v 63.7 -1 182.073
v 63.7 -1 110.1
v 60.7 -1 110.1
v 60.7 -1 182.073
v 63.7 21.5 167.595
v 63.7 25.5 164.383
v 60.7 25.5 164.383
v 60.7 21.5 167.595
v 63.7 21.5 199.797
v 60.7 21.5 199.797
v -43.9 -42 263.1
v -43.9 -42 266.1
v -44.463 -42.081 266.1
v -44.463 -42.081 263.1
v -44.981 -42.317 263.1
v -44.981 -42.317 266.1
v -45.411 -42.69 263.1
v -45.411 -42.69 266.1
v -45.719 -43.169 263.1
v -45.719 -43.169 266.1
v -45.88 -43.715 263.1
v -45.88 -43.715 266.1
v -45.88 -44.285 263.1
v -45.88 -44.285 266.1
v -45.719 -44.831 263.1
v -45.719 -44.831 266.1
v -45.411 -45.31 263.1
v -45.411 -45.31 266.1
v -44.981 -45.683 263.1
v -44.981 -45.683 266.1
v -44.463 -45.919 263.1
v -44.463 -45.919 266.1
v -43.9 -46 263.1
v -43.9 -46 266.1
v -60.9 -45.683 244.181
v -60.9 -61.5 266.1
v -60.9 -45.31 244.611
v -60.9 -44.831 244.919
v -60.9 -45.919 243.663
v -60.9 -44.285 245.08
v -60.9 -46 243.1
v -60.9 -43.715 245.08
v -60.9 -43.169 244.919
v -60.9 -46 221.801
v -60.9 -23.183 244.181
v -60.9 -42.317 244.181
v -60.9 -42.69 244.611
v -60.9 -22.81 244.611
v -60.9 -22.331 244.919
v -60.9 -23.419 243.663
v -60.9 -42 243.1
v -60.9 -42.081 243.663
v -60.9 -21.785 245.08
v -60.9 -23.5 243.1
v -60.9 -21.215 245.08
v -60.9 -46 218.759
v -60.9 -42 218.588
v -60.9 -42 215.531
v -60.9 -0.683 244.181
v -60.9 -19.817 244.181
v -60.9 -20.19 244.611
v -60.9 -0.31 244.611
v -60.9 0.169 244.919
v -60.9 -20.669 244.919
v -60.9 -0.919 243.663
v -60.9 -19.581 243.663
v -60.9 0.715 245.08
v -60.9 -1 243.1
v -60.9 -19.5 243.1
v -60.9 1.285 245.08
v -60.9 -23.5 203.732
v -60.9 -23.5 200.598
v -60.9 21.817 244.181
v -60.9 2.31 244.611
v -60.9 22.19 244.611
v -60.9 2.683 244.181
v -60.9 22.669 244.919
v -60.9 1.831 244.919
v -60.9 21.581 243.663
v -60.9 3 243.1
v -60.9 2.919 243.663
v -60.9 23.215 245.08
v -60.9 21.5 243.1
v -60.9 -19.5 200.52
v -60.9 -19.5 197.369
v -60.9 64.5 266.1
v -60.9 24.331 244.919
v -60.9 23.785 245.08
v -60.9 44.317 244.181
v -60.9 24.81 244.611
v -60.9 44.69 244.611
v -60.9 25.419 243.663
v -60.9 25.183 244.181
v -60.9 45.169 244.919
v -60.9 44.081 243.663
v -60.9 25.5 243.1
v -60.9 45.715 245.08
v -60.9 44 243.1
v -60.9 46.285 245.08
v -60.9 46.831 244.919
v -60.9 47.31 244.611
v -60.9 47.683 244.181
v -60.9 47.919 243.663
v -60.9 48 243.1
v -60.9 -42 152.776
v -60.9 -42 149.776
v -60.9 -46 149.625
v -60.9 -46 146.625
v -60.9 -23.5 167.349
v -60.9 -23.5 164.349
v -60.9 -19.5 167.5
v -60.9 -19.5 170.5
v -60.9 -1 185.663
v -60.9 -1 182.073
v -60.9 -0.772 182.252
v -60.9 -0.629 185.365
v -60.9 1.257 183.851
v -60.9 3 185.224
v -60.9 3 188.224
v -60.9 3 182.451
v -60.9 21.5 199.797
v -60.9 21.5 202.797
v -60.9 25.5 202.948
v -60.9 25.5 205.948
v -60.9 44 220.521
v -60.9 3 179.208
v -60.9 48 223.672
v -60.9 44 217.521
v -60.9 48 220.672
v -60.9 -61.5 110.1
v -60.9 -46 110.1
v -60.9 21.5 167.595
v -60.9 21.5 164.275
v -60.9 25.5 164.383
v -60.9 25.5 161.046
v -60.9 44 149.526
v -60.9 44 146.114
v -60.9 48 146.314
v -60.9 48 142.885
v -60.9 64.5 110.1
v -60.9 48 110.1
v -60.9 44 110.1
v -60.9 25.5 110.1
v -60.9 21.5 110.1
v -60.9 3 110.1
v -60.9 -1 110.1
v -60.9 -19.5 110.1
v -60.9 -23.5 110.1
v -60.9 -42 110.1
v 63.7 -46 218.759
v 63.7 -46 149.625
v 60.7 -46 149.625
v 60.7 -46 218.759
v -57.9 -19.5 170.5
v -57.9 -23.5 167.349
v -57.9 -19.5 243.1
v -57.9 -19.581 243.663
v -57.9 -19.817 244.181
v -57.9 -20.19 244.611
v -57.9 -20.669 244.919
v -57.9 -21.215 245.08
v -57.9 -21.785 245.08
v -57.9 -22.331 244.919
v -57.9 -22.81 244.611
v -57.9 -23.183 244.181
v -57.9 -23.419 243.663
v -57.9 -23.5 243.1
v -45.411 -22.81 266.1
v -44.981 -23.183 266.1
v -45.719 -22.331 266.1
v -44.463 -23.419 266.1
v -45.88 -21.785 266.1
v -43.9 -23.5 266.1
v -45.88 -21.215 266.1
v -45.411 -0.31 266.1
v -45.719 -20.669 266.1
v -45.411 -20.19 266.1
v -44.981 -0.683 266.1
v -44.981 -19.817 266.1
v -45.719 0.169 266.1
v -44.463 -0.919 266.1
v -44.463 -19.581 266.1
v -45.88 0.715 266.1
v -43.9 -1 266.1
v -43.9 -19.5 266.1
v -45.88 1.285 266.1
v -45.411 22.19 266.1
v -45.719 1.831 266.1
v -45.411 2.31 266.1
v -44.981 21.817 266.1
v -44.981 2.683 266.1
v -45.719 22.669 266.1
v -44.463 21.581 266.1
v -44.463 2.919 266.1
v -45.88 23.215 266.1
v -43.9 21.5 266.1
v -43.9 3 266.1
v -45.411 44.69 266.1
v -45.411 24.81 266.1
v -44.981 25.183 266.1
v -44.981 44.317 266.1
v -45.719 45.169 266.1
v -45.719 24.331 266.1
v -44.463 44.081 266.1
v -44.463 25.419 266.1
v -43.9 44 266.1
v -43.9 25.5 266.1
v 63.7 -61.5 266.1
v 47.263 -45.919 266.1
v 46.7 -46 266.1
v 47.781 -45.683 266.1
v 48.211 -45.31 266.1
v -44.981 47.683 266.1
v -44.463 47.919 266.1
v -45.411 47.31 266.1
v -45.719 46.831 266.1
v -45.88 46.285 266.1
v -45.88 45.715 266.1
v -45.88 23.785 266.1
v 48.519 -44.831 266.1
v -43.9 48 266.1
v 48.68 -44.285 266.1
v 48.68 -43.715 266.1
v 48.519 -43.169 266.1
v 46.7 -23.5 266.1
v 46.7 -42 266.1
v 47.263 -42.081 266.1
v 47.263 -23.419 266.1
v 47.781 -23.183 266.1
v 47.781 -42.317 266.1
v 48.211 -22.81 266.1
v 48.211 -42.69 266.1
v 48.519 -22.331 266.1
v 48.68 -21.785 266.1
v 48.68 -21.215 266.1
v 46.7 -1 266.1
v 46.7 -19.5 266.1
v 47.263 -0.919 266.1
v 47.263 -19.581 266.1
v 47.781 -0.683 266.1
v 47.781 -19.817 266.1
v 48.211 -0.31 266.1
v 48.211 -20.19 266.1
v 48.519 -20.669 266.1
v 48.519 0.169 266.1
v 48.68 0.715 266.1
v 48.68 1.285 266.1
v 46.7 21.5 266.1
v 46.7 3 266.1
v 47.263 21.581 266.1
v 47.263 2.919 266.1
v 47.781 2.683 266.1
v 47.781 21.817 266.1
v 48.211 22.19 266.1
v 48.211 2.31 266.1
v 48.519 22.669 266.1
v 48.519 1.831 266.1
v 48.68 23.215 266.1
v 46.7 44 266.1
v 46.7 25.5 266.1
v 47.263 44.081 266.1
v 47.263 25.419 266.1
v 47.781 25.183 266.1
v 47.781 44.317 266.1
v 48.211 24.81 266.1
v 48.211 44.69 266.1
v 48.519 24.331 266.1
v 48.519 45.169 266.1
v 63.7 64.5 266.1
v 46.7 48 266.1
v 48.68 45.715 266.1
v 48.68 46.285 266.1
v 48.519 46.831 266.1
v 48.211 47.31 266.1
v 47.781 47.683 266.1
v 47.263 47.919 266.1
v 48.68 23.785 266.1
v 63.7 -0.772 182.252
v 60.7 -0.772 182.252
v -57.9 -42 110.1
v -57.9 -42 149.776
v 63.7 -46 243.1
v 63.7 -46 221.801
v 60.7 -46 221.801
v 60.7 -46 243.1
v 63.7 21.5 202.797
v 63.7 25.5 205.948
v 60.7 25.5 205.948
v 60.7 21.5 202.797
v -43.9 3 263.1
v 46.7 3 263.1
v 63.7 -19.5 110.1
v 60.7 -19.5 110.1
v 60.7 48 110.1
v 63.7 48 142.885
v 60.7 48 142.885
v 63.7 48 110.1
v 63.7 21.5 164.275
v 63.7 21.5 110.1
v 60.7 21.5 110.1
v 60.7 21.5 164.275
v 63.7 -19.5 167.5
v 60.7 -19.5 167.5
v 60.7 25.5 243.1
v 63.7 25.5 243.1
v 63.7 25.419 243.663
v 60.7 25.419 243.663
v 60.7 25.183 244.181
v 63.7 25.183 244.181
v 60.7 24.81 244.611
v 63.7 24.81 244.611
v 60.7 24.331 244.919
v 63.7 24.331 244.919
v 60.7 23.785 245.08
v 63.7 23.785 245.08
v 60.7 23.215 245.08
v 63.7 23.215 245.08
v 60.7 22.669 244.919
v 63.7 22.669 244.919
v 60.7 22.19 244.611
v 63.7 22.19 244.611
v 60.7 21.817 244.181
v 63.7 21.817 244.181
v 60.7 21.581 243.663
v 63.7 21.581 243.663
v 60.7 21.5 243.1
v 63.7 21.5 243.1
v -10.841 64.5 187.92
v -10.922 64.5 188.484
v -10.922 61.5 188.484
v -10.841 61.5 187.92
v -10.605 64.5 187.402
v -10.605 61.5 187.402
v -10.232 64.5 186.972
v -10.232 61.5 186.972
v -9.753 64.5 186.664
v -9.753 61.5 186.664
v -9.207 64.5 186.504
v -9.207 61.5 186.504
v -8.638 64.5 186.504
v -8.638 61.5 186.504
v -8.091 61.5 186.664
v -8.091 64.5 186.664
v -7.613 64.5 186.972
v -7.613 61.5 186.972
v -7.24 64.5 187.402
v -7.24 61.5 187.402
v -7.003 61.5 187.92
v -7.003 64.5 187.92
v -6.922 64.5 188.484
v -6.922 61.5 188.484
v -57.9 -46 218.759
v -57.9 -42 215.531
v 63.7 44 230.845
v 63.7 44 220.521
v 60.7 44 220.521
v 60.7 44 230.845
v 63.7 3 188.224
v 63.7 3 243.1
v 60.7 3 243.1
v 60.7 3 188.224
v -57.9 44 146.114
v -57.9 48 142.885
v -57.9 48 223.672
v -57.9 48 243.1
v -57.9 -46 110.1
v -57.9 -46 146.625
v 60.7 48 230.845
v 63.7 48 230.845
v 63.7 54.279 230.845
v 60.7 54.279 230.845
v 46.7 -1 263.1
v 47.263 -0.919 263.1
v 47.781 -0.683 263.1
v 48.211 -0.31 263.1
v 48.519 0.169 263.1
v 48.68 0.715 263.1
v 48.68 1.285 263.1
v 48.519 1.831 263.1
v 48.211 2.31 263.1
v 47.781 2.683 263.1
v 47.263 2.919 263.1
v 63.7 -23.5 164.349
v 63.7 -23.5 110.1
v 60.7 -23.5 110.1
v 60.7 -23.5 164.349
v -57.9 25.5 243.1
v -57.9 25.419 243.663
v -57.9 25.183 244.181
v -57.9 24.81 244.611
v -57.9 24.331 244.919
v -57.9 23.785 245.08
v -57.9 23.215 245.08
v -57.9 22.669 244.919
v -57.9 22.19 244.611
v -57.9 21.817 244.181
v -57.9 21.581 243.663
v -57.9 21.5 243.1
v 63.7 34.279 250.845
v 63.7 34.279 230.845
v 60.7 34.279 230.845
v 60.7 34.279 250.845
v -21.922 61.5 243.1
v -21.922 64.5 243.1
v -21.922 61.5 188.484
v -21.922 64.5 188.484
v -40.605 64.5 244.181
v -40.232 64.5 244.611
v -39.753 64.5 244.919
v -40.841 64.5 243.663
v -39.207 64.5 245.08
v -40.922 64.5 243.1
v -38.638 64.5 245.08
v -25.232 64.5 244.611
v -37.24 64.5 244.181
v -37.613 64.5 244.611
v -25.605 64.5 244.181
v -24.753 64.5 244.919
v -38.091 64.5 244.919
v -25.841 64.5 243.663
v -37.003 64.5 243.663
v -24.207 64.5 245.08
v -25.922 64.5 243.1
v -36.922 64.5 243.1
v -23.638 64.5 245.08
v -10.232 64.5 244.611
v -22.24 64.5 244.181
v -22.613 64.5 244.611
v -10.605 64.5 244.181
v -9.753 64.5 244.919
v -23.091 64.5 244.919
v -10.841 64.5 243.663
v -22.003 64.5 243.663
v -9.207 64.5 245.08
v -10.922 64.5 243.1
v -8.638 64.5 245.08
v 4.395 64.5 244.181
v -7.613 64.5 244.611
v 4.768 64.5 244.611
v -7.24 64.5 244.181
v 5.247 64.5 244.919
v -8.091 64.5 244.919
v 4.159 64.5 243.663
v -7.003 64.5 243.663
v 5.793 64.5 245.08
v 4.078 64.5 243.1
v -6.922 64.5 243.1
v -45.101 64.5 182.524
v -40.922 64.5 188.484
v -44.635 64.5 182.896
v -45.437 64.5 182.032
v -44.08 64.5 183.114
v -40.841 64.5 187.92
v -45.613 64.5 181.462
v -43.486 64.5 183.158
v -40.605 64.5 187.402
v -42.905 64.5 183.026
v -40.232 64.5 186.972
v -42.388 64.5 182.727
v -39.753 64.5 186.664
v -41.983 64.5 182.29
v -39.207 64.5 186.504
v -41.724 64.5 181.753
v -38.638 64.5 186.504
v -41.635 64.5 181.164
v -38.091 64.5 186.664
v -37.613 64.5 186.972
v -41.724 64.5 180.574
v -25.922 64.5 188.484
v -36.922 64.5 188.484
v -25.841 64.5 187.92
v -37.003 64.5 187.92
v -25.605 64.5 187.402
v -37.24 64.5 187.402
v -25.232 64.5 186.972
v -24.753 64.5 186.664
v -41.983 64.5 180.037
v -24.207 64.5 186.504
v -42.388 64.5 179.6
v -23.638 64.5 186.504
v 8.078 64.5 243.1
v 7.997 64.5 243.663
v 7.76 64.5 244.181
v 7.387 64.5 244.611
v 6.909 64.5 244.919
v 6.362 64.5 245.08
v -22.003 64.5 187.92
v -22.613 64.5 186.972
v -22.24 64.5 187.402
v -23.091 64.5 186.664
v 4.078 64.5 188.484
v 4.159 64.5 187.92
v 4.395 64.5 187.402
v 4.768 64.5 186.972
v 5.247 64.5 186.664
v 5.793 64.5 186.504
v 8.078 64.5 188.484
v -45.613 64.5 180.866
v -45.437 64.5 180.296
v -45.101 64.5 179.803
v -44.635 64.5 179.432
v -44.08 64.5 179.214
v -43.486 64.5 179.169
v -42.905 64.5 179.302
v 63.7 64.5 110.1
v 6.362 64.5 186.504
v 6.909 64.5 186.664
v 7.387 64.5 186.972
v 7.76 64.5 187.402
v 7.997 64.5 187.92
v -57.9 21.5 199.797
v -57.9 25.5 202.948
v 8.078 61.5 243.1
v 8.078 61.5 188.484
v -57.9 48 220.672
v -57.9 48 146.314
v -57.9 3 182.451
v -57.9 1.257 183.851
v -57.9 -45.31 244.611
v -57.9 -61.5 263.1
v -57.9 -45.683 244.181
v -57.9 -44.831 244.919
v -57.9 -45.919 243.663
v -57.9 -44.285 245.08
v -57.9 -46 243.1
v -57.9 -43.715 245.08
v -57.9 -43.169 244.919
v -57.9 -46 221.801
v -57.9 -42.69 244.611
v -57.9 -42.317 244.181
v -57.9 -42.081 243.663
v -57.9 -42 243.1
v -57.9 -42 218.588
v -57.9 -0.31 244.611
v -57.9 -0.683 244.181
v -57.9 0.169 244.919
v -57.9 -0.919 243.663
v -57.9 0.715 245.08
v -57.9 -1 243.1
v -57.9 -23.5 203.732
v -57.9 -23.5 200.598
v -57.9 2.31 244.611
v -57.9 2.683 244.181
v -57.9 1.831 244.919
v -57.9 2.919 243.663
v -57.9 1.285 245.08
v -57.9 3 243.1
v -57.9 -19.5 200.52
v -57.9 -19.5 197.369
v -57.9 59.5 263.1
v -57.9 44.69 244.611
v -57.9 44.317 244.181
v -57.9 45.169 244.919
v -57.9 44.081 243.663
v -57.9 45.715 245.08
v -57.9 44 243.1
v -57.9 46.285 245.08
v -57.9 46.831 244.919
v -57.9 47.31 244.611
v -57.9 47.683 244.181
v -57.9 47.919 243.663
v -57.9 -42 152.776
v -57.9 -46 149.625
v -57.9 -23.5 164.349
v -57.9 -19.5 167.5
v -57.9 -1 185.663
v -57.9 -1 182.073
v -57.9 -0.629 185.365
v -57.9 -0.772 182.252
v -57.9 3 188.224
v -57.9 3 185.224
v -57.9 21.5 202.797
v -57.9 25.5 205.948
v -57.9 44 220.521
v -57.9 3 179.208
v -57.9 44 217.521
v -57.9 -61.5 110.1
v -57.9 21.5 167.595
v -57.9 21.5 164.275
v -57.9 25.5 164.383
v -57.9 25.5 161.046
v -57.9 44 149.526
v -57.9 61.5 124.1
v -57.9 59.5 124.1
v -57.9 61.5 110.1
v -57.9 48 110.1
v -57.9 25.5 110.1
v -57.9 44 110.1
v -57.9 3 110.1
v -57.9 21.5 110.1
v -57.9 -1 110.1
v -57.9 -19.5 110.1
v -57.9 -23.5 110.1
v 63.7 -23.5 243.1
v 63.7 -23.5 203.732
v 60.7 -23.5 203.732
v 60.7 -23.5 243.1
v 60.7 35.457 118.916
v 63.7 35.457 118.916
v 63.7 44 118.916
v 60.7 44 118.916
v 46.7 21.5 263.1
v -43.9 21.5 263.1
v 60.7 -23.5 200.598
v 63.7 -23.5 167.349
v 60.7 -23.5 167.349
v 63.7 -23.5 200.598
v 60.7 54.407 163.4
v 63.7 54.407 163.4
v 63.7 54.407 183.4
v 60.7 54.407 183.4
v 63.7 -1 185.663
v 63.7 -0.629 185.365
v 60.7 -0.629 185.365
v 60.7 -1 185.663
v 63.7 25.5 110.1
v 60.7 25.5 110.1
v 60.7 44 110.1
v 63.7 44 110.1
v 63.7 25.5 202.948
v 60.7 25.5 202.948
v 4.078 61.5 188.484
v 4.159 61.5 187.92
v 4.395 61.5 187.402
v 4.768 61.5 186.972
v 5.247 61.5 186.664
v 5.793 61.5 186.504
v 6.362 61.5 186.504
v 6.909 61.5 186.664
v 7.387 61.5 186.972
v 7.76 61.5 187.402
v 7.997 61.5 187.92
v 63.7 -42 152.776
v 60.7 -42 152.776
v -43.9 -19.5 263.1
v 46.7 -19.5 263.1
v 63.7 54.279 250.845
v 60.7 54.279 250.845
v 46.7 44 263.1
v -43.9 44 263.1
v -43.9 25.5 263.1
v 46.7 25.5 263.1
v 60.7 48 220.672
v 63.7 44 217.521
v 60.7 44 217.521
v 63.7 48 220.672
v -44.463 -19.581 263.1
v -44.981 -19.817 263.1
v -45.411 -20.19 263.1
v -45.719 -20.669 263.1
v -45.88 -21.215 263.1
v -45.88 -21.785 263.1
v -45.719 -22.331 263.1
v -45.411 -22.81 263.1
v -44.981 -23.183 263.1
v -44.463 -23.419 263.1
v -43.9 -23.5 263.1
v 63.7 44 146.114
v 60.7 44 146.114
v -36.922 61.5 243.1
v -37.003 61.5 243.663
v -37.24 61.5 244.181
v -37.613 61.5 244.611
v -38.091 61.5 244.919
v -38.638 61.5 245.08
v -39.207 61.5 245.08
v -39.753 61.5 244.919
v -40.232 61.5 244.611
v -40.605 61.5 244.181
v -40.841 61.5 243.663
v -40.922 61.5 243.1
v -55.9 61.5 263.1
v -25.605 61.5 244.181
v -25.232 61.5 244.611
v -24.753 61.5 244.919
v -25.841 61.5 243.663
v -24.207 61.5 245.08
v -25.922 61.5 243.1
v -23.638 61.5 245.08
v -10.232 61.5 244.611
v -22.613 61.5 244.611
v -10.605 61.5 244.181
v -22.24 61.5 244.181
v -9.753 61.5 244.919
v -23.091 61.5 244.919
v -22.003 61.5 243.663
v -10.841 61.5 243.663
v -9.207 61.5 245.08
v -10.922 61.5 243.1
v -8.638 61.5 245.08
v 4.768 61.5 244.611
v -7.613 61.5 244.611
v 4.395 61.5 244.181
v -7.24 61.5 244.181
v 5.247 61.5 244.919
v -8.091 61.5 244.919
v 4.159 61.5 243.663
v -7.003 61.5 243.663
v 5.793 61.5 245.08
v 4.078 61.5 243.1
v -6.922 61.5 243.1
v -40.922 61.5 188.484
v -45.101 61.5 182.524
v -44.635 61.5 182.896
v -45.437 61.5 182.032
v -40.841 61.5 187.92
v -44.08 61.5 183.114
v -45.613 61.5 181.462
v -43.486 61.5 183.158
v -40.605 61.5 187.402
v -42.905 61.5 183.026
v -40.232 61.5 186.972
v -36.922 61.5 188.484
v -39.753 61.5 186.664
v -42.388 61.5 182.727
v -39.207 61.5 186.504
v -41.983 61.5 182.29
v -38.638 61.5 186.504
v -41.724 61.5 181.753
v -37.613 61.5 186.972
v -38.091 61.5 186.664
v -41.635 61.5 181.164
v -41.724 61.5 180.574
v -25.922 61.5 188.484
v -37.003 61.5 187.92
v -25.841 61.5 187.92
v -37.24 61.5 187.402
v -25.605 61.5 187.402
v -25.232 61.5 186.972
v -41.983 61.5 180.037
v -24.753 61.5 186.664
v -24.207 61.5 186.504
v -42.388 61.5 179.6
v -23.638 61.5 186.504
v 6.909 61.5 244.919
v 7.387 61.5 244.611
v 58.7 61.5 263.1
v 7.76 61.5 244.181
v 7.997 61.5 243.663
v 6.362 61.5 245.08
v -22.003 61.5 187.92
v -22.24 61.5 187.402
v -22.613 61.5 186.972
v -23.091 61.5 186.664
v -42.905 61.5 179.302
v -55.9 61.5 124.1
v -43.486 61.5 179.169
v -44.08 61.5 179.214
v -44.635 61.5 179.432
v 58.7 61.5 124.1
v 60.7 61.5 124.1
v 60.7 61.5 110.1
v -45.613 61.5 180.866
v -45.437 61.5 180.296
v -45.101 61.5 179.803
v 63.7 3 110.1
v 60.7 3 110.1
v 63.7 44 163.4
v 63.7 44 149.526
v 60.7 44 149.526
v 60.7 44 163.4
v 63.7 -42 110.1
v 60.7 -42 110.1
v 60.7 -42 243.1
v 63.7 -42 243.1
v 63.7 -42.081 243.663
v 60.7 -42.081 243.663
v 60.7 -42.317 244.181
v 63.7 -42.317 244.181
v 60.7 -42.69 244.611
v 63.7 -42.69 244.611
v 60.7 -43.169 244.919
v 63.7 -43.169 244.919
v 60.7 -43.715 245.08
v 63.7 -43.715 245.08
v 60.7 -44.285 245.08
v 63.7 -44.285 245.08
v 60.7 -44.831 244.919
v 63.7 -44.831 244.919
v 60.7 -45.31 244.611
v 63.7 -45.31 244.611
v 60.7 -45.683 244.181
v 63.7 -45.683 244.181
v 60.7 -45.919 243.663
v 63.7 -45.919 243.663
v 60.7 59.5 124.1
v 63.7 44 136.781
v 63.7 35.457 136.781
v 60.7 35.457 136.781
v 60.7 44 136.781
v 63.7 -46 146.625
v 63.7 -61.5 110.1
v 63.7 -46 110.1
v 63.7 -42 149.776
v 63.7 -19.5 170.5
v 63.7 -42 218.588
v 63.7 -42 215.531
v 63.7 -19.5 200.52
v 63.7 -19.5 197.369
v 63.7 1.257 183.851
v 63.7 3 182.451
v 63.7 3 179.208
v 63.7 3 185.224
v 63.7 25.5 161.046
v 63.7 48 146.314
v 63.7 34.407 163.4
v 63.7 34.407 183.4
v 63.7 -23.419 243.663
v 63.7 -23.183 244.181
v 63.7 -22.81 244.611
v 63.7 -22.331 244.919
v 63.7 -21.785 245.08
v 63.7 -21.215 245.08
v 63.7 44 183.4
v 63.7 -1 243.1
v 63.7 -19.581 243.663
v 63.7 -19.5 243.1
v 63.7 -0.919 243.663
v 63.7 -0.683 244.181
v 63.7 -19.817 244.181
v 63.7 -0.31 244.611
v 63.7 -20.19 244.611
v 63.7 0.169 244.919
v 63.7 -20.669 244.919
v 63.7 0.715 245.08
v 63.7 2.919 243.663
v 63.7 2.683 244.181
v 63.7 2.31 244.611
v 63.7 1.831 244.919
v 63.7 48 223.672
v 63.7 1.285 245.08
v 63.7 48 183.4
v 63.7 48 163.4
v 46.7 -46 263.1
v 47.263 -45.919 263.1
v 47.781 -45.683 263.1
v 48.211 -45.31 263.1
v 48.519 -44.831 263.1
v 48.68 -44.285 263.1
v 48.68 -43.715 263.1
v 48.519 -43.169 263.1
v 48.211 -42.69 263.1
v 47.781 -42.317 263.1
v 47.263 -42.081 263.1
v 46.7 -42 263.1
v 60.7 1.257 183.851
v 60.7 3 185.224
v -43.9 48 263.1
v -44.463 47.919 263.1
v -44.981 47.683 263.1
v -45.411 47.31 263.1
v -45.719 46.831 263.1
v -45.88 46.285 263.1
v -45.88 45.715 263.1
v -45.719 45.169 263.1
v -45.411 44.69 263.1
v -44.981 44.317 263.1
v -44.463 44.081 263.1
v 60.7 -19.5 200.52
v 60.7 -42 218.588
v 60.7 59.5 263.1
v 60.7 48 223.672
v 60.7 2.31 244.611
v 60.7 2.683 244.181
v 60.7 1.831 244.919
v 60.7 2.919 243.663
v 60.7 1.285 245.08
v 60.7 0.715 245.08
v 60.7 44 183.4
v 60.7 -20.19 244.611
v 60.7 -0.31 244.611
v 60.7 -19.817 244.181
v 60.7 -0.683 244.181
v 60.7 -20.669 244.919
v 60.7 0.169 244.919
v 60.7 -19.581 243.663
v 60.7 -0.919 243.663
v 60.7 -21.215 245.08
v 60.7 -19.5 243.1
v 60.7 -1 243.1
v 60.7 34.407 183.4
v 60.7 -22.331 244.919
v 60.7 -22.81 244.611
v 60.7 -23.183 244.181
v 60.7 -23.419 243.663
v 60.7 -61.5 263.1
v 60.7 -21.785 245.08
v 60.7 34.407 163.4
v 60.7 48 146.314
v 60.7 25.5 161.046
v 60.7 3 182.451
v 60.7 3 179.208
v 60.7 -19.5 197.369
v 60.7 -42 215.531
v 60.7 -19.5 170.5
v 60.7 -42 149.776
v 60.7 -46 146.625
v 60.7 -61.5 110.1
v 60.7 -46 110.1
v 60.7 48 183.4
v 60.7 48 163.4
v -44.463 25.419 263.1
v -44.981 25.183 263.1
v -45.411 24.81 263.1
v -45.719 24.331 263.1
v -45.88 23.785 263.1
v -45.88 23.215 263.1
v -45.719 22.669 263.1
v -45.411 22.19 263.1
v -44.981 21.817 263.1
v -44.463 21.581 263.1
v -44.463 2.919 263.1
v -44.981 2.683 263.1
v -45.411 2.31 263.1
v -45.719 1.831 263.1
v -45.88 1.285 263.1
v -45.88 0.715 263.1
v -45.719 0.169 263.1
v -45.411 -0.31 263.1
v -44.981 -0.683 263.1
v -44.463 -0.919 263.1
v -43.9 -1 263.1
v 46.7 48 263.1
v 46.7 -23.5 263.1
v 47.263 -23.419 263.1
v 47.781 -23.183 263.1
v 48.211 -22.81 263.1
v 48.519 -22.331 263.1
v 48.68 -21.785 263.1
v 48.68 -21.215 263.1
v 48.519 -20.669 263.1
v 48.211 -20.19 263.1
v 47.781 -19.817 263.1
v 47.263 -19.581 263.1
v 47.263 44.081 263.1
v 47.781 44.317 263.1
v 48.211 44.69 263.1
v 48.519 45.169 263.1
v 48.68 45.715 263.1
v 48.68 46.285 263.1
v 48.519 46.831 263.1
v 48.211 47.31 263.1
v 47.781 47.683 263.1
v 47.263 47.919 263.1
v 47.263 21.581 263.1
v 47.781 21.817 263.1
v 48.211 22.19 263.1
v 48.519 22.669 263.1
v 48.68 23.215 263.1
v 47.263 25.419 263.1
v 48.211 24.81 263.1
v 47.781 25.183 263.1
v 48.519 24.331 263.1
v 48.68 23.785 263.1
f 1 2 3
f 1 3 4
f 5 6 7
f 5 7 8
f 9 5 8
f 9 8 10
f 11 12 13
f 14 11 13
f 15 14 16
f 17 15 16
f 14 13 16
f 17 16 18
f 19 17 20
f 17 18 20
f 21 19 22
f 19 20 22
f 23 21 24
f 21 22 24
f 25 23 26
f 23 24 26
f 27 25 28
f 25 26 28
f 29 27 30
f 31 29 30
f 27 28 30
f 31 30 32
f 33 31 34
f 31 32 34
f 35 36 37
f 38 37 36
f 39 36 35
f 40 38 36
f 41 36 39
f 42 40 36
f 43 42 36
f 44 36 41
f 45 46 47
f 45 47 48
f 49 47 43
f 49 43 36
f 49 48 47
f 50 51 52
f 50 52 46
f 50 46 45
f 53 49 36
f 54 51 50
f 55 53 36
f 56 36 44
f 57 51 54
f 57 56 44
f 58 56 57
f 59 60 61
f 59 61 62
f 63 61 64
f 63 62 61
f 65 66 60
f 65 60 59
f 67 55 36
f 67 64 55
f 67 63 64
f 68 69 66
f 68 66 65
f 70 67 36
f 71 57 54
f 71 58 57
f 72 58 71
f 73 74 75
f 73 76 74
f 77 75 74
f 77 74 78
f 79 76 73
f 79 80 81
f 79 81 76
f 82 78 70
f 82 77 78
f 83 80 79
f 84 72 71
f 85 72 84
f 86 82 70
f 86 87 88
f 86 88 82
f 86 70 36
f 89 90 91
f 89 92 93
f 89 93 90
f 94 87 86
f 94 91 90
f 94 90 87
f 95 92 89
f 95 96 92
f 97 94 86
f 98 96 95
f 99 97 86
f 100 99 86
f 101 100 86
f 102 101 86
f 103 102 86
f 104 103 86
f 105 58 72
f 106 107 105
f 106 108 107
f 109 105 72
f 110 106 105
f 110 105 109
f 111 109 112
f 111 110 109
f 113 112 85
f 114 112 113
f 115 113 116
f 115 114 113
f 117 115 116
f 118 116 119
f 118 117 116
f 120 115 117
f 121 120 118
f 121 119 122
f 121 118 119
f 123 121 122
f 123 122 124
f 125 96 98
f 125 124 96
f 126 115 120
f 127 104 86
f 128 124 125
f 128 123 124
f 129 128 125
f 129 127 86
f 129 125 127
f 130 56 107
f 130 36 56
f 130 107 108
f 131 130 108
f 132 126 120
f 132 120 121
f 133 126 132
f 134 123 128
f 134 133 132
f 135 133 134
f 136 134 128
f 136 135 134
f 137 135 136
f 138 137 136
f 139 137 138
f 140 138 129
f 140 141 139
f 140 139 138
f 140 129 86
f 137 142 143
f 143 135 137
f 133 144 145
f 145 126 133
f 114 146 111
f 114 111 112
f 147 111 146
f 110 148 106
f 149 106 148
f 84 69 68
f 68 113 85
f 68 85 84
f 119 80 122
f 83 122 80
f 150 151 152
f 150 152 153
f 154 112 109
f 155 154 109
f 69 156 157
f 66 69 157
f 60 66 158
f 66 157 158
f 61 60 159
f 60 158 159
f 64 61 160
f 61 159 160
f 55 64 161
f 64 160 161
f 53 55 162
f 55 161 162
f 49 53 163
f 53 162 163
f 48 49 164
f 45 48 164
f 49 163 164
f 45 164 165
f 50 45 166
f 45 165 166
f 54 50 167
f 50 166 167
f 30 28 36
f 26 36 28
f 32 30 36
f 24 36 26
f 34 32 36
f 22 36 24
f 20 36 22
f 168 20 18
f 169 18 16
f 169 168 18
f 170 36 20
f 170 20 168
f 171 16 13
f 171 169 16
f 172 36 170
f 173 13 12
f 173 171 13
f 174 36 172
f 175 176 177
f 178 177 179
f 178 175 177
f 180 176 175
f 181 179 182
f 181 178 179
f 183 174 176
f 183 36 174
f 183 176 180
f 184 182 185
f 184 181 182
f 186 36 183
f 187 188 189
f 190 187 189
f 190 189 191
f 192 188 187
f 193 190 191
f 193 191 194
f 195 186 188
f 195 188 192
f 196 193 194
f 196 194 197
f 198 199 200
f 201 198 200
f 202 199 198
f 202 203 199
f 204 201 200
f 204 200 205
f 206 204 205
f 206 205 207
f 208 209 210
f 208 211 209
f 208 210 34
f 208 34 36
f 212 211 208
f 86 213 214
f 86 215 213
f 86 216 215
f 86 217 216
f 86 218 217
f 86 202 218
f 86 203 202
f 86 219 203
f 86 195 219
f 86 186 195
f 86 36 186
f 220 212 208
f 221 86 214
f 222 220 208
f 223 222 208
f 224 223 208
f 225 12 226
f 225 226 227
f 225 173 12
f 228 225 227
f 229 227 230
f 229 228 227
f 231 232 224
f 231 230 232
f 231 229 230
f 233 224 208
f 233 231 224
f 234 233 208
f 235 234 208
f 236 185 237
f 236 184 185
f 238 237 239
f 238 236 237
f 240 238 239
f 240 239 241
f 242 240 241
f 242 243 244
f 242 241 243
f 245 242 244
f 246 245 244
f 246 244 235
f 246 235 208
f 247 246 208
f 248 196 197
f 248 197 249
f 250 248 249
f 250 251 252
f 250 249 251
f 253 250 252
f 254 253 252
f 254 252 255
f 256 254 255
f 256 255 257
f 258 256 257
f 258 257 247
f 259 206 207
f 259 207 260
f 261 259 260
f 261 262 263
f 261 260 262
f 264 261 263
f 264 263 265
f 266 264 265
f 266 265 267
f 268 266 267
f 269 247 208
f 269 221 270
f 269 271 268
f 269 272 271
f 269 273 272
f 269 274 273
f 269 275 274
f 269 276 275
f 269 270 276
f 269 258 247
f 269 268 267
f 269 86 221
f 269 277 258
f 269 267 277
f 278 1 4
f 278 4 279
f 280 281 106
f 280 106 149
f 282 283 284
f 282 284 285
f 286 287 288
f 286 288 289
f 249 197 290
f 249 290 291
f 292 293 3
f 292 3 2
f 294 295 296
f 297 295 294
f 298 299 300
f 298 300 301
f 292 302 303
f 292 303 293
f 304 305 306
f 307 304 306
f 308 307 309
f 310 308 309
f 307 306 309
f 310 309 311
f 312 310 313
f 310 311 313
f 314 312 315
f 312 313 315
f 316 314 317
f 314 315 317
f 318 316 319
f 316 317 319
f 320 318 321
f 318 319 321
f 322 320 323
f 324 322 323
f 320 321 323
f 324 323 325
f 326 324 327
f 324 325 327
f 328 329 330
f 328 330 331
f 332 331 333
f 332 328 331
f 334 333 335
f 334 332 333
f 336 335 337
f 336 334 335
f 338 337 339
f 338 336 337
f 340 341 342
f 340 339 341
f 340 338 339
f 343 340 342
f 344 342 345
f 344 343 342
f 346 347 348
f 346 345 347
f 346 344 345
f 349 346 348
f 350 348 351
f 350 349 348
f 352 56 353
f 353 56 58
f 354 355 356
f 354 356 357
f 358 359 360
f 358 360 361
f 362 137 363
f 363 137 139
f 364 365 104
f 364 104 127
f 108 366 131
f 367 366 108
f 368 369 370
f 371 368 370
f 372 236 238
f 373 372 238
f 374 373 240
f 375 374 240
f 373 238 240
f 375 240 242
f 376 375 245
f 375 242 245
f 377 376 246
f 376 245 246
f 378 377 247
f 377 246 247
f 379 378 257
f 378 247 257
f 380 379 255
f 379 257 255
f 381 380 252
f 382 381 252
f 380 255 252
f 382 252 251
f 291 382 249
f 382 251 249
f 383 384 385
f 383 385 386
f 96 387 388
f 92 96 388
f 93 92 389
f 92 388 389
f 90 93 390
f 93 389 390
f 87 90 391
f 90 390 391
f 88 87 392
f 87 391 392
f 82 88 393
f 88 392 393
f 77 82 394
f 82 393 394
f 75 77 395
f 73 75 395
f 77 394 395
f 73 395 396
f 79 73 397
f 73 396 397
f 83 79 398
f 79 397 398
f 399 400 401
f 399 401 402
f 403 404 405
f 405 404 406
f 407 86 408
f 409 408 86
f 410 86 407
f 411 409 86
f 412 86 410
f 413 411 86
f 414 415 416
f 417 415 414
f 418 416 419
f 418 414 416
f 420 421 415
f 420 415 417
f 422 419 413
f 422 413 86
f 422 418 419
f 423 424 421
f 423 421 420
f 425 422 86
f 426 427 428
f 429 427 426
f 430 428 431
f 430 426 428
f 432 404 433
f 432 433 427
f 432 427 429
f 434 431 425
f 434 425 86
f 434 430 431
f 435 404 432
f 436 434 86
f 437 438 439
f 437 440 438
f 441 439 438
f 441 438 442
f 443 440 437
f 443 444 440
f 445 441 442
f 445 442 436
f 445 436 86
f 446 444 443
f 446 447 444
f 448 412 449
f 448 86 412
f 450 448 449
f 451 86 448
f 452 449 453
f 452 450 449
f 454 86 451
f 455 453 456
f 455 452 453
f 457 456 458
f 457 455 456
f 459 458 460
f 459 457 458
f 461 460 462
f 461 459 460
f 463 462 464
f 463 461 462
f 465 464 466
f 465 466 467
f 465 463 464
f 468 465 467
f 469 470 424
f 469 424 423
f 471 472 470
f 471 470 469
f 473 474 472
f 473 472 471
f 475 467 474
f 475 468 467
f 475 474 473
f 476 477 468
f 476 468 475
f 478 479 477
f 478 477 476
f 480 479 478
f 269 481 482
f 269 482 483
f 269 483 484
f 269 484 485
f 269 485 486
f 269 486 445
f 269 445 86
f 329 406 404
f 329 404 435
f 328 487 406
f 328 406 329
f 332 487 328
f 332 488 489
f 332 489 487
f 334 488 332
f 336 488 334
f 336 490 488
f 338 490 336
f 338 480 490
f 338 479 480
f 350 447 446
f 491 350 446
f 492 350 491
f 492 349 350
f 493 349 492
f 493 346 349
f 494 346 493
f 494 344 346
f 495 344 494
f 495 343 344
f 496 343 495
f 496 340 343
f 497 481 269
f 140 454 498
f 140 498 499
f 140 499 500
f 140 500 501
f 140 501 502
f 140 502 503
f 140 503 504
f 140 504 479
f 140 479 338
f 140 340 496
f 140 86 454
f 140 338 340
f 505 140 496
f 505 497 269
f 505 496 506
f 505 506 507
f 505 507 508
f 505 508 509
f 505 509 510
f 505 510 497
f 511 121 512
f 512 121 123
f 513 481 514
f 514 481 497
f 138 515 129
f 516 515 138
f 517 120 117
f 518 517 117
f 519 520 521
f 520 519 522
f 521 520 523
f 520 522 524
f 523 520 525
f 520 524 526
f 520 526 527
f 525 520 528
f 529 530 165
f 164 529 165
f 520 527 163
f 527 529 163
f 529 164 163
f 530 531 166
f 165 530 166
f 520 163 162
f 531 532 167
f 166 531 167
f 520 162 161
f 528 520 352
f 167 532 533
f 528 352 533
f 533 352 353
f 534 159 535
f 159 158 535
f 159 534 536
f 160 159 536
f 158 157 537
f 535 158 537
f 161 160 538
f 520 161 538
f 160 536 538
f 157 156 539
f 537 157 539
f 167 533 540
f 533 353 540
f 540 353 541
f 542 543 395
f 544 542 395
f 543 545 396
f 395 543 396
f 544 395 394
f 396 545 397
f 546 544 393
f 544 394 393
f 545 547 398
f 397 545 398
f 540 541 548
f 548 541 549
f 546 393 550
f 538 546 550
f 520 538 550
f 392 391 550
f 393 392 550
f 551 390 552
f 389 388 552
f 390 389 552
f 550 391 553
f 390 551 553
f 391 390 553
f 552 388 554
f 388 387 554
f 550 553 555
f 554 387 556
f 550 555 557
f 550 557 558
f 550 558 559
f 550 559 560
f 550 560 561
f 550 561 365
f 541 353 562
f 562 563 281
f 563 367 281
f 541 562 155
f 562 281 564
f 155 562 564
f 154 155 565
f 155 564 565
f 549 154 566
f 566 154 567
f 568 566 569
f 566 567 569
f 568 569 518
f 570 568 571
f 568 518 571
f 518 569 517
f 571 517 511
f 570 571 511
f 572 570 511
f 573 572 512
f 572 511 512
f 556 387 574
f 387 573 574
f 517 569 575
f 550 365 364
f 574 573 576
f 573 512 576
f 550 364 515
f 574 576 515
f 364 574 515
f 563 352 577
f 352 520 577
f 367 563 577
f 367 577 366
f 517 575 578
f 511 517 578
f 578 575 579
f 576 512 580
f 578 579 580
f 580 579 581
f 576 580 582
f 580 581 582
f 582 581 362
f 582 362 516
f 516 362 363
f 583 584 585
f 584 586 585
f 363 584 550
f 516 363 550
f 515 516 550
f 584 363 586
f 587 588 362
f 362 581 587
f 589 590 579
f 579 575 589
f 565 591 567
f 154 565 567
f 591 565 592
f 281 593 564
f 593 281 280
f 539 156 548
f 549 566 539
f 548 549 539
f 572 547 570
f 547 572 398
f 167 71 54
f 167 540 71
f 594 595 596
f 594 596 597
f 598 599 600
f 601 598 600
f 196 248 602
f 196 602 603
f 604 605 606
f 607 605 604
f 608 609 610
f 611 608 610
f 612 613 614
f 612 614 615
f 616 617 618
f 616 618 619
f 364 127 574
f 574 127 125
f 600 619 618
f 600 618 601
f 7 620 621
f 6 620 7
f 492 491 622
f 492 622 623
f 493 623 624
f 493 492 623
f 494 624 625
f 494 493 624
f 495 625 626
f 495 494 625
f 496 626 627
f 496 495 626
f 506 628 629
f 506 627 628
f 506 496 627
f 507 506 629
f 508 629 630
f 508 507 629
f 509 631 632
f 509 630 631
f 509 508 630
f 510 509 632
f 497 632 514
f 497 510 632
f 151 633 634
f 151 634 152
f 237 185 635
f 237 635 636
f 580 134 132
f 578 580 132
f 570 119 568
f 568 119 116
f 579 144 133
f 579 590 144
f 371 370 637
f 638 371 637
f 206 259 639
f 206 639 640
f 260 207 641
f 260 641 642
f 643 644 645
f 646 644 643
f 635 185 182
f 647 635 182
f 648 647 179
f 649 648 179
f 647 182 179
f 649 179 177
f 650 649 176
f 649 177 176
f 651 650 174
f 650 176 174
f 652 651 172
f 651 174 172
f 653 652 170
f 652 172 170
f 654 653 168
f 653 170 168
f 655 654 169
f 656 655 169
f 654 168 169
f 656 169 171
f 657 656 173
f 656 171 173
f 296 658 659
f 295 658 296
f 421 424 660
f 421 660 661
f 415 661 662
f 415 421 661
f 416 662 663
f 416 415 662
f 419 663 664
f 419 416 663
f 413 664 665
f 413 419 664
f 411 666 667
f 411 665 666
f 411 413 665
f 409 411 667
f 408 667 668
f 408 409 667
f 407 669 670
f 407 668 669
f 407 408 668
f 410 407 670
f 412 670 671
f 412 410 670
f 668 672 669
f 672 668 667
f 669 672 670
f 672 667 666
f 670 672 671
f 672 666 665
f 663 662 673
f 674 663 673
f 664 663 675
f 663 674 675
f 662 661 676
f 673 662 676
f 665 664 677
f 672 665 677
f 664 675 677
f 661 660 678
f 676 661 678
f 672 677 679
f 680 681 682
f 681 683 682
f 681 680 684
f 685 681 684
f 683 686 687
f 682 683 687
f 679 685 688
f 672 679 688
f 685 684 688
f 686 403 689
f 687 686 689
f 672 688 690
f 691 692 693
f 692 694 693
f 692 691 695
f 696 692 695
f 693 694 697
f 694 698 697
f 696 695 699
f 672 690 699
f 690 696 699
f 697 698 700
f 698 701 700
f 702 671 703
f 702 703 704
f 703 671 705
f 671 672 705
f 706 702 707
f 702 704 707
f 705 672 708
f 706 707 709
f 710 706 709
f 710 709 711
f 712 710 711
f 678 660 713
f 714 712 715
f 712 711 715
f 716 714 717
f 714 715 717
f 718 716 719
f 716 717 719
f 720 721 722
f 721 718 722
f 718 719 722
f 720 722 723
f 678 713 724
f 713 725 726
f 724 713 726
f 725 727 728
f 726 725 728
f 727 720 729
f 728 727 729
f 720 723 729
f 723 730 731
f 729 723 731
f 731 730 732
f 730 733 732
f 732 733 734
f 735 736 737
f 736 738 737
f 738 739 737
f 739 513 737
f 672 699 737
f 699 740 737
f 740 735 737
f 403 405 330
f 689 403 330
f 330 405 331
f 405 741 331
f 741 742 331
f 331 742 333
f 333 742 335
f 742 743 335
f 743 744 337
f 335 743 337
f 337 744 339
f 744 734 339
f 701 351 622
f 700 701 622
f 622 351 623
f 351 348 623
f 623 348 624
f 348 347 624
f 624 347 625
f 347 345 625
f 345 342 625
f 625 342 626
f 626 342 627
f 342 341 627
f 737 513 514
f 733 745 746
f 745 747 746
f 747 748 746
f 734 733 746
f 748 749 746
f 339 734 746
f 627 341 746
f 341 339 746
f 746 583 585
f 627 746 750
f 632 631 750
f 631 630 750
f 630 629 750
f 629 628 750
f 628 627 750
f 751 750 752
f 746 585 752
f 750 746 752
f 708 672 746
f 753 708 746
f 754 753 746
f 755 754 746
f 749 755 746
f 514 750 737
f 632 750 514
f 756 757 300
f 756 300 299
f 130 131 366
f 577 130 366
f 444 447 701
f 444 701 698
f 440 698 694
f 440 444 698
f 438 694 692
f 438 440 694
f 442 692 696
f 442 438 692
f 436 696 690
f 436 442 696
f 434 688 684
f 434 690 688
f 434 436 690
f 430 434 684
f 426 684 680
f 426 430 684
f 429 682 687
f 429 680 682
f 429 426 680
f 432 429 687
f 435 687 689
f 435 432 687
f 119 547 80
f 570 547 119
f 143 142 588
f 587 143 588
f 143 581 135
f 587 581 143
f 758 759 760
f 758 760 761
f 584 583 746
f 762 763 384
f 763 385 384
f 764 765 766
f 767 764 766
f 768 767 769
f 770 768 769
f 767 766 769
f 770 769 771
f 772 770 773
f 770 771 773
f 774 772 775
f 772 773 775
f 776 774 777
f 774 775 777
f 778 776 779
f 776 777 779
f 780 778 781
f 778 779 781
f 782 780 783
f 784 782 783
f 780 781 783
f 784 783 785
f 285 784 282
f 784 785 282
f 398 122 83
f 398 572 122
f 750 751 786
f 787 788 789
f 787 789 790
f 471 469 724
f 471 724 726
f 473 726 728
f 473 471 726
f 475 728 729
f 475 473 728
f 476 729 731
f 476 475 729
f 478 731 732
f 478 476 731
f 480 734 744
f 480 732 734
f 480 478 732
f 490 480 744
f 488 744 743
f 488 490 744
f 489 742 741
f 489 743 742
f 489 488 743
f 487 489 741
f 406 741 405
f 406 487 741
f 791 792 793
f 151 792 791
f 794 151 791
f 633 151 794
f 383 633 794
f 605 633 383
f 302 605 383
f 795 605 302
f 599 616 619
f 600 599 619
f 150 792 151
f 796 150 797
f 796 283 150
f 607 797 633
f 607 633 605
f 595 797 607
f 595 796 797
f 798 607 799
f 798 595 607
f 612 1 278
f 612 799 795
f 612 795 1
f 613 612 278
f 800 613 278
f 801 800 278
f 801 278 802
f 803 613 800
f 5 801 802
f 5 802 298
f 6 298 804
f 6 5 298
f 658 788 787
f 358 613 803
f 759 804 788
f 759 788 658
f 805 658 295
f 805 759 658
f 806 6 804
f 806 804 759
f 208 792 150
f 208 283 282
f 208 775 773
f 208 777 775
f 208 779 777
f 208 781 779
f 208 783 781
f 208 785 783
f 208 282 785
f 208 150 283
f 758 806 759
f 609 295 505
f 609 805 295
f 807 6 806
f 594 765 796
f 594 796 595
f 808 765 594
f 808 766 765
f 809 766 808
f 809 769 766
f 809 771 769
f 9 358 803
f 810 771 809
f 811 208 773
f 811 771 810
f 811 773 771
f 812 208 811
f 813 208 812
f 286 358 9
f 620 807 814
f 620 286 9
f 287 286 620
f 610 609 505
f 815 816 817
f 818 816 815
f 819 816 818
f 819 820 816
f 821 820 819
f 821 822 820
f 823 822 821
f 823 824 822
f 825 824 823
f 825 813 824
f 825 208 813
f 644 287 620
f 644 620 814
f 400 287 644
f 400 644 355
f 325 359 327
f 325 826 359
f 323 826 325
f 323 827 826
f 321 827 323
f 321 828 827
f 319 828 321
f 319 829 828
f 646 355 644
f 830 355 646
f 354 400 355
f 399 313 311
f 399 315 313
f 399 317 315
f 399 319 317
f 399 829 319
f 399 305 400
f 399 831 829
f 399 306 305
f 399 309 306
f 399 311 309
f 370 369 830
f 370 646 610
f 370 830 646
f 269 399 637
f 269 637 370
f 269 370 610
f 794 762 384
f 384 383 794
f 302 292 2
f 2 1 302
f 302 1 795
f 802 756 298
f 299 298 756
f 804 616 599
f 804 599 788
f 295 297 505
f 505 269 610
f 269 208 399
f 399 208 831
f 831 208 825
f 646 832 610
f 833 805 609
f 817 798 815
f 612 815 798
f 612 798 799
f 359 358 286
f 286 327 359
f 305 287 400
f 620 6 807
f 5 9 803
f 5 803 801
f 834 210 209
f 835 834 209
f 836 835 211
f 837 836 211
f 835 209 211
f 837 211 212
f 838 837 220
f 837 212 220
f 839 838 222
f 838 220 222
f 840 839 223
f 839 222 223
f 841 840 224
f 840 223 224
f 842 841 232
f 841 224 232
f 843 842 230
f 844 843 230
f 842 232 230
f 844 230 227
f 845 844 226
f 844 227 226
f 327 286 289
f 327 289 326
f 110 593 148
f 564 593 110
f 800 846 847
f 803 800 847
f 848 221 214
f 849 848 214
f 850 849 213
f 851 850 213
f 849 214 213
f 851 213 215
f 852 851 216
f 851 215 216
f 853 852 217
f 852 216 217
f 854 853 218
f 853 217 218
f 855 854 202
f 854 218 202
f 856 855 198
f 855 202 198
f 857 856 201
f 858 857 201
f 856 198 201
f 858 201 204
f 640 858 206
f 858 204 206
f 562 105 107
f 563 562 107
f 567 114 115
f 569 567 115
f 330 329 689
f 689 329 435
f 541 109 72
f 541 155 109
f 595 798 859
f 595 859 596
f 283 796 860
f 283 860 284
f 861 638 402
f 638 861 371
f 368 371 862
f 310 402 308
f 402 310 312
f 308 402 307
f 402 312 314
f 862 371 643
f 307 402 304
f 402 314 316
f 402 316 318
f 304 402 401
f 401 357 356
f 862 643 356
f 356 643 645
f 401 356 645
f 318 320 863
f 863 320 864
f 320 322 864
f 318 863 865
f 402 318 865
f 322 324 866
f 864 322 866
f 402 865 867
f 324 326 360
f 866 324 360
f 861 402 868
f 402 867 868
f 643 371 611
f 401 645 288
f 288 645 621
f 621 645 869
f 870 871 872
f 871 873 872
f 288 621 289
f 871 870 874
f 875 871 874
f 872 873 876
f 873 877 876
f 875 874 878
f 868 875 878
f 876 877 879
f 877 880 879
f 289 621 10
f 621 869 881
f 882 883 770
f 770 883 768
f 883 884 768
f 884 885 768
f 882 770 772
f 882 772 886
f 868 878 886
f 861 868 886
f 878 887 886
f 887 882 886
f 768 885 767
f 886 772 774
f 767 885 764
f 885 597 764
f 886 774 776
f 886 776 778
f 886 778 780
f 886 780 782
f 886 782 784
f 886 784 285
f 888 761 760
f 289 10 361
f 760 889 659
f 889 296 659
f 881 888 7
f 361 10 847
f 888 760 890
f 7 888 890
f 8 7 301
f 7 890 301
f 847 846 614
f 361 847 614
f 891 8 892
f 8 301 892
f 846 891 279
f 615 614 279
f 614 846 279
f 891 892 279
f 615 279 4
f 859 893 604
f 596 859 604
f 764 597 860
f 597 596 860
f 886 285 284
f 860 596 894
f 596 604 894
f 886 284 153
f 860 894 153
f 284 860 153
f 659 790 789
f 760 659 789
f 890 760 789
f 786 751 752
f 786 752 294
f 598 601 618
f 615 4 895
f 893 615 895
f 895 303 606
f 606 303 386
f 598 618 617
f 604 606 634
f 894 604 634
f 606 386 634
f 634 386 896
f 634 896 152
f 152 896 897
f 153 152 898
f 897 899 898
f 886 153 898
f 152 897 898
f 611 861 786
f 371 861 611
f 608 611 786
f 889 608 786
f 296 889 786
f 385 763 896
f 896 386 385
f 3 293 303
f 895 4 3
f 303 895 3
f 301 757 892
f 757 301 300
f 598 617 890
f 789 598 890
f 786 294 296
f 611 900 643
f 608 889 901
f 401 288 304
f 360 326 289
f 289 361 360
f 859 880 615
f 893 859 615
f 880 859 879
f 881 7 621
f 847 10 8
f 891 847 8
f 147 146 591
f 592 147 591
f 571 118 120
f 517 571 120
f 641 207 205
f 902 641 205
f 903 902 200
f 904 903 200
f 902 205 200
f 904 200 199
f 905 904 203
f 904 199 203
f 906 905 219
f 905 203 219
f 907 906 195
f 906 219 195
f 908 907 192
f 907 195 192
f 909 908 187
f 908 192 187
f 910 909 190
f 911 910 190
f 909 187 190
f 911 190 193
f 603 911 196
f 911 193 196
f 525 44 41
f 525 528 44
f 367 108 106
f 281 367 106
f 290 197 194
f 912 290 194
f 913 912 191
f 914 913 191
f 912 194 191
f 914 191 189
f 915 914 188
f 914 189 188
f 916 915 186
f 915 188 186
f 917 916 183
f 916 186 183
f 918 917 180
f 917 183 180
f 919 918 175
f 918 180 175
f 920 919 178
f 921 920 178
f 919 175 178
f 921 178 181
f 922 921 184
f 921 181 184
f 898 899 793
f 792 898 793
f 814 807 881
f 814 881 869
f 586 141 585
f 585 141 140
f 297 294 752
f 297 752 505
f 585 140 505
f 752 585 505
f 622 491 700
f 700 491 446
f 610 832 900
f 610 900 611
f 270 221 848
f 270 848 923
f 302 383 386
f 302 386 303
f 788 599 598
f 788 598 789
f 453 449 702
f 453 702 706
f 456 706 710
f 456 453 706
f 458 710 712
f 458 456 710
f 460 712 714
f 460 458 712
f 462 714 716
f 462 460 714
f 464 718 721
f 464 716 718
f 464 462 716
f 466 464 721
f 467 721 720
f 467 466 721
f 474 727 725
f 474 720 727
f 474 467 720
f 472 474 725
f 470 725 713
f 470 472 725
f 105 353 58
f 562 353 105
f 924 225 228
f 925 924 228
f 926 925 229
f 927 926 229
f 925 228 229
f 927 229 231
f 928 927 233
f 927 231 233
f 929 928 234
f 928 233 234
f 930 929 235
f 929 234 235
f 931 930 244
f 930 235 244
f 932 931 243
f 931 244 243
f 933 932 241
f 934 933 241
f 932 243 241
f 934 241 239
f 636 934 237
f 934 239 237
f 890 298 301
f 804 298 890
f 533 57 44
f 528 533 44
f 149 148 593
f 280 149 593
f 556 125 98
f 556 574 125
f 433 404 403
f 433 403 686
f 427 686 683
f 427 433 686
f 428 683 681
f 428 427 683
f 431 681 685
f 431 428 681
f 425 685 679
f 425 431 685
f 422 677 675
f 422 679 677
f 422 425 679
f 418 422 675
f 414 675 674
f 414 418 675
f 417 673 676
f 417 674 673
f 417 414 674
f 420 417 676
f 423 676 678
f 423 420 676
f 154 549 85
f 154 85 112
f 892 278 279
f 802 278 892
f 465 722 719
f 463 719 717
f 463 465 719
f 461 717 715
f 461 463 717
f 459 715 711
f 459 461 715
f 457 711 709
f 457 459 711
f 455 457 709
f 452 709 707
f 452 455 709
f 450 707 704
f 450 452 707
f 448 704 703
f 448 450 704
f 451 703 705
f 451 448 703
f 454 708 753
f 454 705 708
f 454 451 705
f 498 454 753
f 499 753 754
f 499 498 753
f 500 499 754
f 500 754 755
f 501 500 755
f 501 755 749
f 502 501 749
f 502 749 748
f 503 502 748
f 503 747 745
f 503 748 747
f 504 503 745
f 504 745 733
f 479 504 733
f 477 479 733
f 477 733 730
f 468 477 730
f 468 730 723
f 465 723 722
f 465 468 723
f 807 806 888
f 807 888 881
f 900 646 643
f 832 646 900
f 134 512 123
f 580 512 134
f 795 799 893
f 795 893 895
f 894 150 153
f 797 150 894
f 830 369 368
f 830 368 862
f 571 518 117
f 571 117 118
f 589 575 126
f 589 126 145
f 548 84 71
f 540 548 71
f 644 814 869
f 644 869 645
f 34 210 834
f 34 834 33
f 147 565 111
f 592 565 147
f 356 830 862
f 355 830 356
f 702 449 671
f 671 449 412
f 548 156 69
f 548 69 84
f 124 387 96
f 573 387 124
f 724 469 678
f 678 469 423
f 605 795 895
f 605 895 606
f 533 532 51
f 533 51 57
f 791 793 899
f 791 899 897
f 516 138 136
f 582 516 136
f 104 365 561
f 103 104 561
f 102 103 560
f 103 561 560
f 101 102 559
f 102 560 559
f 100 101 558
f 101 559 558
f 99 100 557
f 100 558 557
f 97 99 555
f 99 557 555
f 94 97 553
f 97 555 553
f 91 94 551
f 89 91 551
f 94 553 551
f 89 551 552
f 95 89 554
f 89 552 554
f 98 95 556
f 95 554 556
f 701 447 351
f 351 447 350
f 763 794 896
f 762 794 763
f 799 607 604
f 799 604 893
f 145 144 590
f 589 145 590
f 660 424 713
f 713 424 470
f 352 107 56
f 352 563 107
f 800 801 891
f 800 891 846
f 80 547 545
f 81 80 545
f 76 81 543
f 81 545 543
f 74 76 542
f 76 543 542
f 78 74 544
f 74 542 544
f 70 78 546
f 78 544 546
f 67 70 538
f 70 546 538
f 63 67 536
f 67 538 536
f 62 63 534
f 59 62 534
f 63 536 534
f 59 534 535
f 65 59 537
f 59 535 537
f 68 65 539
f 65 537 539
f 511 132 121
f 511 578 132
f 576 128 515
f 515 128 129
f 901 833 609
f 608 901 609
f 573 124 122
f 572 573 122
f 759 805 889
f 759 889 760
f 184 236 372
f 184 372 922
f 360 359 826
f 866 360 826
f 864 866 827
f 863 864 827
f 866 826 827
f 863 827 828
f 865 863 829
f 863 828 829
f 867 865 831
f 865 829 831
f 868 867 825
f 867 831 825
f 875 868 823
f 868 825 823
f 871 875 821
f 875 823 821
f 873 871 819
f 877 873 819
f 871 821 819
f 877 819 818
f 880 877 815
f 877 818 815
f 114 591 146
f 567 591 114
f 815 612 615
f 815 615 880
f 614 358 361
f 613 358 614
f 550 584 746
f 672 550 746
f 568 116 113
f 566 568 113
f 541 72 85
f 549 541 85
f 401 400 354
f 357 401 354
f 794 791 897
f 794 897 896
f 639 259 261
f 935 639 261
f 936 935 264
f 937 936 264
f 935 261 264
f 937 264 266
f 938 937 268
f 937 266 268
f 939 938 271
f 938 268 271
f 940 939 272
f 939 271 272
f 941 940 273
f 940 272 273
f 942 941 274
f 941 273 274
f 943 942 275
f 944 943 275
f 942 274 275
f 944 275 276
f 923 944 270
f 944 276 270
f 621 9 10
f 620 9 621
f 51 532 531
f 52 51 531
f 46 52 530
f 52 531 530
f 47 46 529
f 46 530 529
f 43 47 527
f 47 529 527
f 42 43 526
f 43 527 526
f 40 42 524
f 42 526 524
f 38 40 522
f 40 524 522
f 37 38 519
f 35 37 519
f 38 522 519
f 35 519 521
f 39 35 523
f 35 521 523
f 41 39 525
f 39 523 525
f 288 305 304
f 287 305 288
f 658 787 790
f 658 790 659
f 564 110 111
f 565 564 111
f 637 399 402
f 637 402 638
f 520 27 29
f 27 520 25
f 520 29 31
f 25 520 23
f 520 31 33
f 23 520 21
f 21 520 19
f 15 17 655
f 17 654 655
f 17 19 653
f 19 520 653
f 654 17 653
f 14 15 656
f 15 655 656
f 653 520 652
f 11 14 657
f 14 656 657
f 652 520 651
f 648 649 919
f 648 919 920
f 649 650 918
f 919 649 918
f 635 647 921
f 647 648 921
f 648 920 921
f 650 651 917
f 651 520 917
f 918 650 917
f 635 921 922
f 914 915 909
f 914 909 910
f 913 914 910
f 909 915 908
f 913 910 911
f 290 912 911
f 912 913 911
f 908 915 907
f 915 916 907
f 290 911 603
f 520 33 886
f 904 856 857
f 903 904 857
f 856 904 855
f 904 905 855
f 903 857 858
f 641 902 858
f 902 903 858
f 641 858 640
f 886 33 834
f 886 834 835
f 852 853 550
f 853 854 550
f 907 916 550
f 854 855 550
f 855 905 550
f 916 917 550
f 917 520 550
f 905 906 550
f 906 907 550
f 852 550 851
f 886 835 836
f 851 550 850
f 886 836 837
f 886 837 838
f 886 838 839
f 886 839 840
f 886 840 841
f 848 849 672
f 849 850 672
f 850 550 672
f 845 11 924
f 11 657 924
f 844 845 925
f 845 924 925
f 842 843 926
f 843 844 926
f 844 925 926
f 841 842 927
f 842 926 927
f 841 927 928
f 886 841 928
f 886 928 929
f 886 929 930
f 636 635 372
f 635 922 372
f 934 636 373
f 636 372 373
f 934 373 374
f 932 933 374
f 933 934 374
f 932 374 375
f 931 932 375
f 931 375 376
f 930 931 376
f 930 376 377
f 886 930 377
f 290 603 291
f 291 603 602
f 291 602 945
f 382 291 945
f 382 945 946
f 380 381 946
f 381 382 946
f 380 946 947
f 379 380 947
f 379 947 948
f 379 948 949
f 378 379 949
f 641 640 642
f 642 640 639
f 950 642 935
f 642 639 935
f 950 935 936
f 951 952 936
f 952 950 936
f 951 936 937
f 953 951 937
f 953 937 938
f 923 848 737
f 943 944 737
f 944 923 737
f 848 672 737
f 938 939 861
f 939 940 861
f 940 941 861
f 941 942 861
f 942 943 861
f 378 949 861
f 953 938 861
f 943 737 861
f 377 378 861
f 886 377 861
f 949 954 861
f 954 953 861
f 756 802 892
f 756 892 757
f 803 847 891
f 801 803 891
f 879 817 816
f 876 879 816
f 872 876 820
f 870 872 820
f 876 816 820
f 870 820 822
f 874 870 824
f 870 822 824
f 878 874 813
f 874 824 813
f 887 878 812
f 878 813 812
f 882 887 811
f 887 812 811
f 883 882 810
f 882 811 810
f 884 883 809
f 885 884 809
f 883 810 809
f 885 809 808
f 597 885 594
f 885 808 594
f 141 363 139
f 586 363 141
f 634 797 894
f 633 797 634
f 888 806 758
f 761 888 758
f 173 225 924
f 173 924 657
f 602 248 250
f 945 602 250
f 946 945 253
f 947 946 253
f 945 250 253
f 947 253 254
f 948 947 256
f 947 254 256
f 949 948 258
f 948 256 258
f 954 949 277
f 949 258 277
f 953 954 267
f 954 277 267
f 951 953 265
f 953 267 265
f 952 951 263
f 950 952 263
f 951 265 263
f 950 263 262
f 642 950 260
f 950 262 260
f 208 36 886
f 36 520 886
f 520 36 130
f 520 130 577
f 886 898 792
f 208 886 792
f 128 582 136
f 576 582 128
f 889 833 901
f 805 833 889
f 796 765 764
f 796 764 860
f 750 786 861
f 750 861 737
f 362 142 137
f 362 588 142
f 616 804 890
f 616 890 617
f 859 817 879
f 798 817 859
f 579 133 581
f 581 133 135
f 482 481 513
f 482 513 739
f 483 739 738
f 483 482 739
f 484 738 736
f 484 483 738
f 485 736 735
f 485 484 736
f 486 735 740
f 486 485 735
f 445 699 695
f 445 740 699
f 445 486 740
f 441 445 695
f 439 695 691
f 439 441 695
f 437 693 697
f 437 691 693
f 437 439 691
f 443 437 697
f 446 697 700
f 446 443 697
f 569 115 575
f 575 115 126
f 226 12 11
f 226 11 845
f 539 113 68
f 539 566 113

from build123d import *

# Parameters (mm, degrees)
PAD004_DEPTH           = 153
PAD005_DEPTH           = 139
SKETCH007_W            = 124.6
SKETCH007_H            = 126
PAD006_DEPTH           = 3
POCKET002_DEPTH        = 124.601
LINEARPATTERN001_COUNT = 5
LINEARPATTERN001_PITCH = 22.5
POCKET003_DEPTH        = 4
LINEARPATTERN002_COUNT = 5
LINEARPATTERN002_PITCH = 22.5
SKETCH015_R            = 2
POCKET006_DEPTH        = 5
SKETCH016_W            = 12.436569
SKETCH016_H            = 17.864411
SKETCH016_W_2          = 20
SKETCH016_H_2          = 20
POCKET008_DEPTH        = 5
PAD007_DEPTH           = 3
PAD008_DEPTH           = 3


with BuildPart() as part:
    # Sketch006 → Pad004 (new body)
    with BuildSketch(Plane.XY):
        Polygon((62.3, 64.5), (-62.3, 64.5), (-62.3, -61.5), (-59.3, -61.5), (-59.3, 61.5), (59.3, 61.5), (59.3, -61.5), (62.3, -61.5), align=None)
    extrude(amount=PAD004_DEPTH)

    # Sketch008 (on DatumPlane) → Pad005 (join)
    with BuildSketch(Plane.XY.offset(153)):
        Polygon((-59.3, 59.5), (-57.299999, 61.5), (-59.3, 61.5), align=None)
    pad005 = extrude(amount=-PAD005_DEPTH)

    # Mirrored001: Pad005 across Sketch008 V_Axis
    add(pad005.mirror(Plane(origin=(0, 0, 153), x_dir=(0, 0, 1), z_dir=(1, 0, 0))))

    # Sketch007 (on DatumPlane) → Pad006 (join)
    with BuildSketch(Plane.XY.offset(153)):
        with Locations((0, 1.5)):
            Rectangle(SKETCH007_W, SKETCH007_H)
    extrude(amount=PAD006_DEPTH)

    # Sketch010 (on DatumPlane) → Pocket002 (cut, through all)
    with BuildSketch(Plane.YZ.offset(62.3)):
        with BuildLine():
            Line((-46, -89.527603), (-46, 133))
            ThreePointArc((-42, 133), (-44, 135), (-46, 133))
            Line((-42, 133), (-42, -89.527603))
            ThreePointArc((-46, -89.527603), (-44, -91.527603), (-42, -89.527603))
        make_face()
    pocket002 = extrude(amount=-POCKET002_DEPTH, mode=Mode.SUBTRACT)

    # LinearPattern001: Pocket002 ×5
    with Locations(*[(0, i * LINEARPATTERN001_PITCH, 0) for i in range(1, LINEARPATTERN001_COUNT)]):
        add(pocket002, mode=Mode.SUBTRACT)

    # Sketch011 (on Face13 of Pad006) → Pocket003 (cut)
    with BuildSketch(Plane.XY.offset(156)):
        with BuildLine():
            Line((-45.3, -42), (45.3, -42))
            ThreePointArc((45.3, -46), (47.3, -44), (45.3, -42))
            Line((45.3, -46), (-45.3, -46))
            ThreePointArc((-45.3, -42), (-47.3, -44), (-45.3, -46))
        make_face()
    pocket003 = extrude(amount=-POCKET003_DEPTH, mode=Mode.SUBTRACT)

    # LinearPattern002: Pocket003 ×5
    with Locations(*[(0, i * LINEARPATTERN002_PITCH, 0) for i in range(1, LINEARPATTERN002_COUNT)]):
        add(pocket003, mode=Mode.SUBTRACT)

    # Sketch015 (on DatumPlane) → Pocket006 (cut)
    with BuildSketch(Plane.XZ.offset(-64.5)):
        with Locations((-45.035357, 71.063824)):
            Circle(SKETCH015_R)
        with BuildLine():
            Line((-27.322272, 78.383734), (-27.322272, 133))
            ThreePointArc((-23.322272, 133), (-25.322272, 135), (-27.322272, 133))
            Line((-23.322272, 133), (-23.322272, 78.383734))
            ThreePointArc((-27.322272, 78.383734), (-25.322272, 76.383734), (-23.322272, 78.383734))
        make_face()
        with BuildLine():
            Line((-12.322272, 78.383734), (-12.322272, 133))
            ThreePointArc((-8.322272, 133), (-10.322272, 135), (-12.322272, 133))
            Line((-8.322272, 133), (-8.322272, 78.383734))
            ThreePointArc((-12.322272, 78.383734), (-10.322272, 76.383734), (-8.322272, 78.383734))
        make_face()
        with BuildLine():
            Line((2.677728, 78.383734), (2.677728, 133))
            ThreePointArc((6.677728, 133), (4.677728, 135), (2.677728, 133))
            Line((6.677728, 133), (6.677728, 78.383734))
            ThreePointArc((2.677728, 78.383734), (4.677728, 76.383734), (6.677728, 78.383734))
        make_face()
        with BuildLine():
            Line((-42.322272, 78.383734), (-42.322272, 133))
            ThreePointArc((-38.322272, 133), (-40.322272, 135), (-42.322272, 133))
            Line((-38.322272, 133), (-38.322272, 78.383734))
            ThreePointArc((-42.322272, 78.383734), (-40.322272, 76.383734), (-38.322272, 78.383734))
        make_face()
    extrude(amount=POCKET006_DEPTH, mode=Mode.SUBTRACT)

    # Sketch016 (on DatumPlane) → Pocket008 (cut)
    with BuildSketch(Plane.YZ.offset(62.3)):
        with Locations((41.675534, 17.748693)):
            Rectangle(SKETCH016_W, SKETCH016_H)
        with Locations((44.407095, 63.300186)):
            Rectangle(SKETCH016_W_2, SKETCH016_H_2)
        with Locations((44.279243, 130.745399)):
            Rectangle(SKETCH016_W_2, SKETCH016_H_2)
    extrude(amount=-POCKET008_DEPTH, mode=Mode.SUBTRACT)

    # Sketch017 (on DatumPlane) → Pad007 (join)
    with BuildSketch(Plane.YZ.offset(62.3)):
        Polygon((55.794507, 119.712103), (-56.964375, 30.887549), (-56.964375, 27.887549), (55.794507, 116.712103), align=None)
        Polygon((54.067337, 31.341833), (-55.976406, 119.712103), (-55.976406, 116.712103), (54.067337, 27.887549), align=None)
    extrude(amount=-PAD007_DEPTH)

    # Sketch018 (on DatumPlane) → Pad008 (join)
    with BuildSketch(Plane.YZ.offset(-62.3)):
        Polygon((55.794507, 119.712103), (-56.964375, 30.887549), (-56.964375, 27.887549), (55.794507, 116.712103), align=None)
        Polygon((54.067337, 31.341833), (-55.976406, 119.712103), (-55.976406, 116.712103), (54.067337, 27.887549), align=None)
    extrude(amount=PAD008_DEPTH)


with BuildPart() as part_1:
    # Body001 placement: moved
    add(part.part.moved(Location((1.4, 0, 110.1))))


solid = part_1.part
